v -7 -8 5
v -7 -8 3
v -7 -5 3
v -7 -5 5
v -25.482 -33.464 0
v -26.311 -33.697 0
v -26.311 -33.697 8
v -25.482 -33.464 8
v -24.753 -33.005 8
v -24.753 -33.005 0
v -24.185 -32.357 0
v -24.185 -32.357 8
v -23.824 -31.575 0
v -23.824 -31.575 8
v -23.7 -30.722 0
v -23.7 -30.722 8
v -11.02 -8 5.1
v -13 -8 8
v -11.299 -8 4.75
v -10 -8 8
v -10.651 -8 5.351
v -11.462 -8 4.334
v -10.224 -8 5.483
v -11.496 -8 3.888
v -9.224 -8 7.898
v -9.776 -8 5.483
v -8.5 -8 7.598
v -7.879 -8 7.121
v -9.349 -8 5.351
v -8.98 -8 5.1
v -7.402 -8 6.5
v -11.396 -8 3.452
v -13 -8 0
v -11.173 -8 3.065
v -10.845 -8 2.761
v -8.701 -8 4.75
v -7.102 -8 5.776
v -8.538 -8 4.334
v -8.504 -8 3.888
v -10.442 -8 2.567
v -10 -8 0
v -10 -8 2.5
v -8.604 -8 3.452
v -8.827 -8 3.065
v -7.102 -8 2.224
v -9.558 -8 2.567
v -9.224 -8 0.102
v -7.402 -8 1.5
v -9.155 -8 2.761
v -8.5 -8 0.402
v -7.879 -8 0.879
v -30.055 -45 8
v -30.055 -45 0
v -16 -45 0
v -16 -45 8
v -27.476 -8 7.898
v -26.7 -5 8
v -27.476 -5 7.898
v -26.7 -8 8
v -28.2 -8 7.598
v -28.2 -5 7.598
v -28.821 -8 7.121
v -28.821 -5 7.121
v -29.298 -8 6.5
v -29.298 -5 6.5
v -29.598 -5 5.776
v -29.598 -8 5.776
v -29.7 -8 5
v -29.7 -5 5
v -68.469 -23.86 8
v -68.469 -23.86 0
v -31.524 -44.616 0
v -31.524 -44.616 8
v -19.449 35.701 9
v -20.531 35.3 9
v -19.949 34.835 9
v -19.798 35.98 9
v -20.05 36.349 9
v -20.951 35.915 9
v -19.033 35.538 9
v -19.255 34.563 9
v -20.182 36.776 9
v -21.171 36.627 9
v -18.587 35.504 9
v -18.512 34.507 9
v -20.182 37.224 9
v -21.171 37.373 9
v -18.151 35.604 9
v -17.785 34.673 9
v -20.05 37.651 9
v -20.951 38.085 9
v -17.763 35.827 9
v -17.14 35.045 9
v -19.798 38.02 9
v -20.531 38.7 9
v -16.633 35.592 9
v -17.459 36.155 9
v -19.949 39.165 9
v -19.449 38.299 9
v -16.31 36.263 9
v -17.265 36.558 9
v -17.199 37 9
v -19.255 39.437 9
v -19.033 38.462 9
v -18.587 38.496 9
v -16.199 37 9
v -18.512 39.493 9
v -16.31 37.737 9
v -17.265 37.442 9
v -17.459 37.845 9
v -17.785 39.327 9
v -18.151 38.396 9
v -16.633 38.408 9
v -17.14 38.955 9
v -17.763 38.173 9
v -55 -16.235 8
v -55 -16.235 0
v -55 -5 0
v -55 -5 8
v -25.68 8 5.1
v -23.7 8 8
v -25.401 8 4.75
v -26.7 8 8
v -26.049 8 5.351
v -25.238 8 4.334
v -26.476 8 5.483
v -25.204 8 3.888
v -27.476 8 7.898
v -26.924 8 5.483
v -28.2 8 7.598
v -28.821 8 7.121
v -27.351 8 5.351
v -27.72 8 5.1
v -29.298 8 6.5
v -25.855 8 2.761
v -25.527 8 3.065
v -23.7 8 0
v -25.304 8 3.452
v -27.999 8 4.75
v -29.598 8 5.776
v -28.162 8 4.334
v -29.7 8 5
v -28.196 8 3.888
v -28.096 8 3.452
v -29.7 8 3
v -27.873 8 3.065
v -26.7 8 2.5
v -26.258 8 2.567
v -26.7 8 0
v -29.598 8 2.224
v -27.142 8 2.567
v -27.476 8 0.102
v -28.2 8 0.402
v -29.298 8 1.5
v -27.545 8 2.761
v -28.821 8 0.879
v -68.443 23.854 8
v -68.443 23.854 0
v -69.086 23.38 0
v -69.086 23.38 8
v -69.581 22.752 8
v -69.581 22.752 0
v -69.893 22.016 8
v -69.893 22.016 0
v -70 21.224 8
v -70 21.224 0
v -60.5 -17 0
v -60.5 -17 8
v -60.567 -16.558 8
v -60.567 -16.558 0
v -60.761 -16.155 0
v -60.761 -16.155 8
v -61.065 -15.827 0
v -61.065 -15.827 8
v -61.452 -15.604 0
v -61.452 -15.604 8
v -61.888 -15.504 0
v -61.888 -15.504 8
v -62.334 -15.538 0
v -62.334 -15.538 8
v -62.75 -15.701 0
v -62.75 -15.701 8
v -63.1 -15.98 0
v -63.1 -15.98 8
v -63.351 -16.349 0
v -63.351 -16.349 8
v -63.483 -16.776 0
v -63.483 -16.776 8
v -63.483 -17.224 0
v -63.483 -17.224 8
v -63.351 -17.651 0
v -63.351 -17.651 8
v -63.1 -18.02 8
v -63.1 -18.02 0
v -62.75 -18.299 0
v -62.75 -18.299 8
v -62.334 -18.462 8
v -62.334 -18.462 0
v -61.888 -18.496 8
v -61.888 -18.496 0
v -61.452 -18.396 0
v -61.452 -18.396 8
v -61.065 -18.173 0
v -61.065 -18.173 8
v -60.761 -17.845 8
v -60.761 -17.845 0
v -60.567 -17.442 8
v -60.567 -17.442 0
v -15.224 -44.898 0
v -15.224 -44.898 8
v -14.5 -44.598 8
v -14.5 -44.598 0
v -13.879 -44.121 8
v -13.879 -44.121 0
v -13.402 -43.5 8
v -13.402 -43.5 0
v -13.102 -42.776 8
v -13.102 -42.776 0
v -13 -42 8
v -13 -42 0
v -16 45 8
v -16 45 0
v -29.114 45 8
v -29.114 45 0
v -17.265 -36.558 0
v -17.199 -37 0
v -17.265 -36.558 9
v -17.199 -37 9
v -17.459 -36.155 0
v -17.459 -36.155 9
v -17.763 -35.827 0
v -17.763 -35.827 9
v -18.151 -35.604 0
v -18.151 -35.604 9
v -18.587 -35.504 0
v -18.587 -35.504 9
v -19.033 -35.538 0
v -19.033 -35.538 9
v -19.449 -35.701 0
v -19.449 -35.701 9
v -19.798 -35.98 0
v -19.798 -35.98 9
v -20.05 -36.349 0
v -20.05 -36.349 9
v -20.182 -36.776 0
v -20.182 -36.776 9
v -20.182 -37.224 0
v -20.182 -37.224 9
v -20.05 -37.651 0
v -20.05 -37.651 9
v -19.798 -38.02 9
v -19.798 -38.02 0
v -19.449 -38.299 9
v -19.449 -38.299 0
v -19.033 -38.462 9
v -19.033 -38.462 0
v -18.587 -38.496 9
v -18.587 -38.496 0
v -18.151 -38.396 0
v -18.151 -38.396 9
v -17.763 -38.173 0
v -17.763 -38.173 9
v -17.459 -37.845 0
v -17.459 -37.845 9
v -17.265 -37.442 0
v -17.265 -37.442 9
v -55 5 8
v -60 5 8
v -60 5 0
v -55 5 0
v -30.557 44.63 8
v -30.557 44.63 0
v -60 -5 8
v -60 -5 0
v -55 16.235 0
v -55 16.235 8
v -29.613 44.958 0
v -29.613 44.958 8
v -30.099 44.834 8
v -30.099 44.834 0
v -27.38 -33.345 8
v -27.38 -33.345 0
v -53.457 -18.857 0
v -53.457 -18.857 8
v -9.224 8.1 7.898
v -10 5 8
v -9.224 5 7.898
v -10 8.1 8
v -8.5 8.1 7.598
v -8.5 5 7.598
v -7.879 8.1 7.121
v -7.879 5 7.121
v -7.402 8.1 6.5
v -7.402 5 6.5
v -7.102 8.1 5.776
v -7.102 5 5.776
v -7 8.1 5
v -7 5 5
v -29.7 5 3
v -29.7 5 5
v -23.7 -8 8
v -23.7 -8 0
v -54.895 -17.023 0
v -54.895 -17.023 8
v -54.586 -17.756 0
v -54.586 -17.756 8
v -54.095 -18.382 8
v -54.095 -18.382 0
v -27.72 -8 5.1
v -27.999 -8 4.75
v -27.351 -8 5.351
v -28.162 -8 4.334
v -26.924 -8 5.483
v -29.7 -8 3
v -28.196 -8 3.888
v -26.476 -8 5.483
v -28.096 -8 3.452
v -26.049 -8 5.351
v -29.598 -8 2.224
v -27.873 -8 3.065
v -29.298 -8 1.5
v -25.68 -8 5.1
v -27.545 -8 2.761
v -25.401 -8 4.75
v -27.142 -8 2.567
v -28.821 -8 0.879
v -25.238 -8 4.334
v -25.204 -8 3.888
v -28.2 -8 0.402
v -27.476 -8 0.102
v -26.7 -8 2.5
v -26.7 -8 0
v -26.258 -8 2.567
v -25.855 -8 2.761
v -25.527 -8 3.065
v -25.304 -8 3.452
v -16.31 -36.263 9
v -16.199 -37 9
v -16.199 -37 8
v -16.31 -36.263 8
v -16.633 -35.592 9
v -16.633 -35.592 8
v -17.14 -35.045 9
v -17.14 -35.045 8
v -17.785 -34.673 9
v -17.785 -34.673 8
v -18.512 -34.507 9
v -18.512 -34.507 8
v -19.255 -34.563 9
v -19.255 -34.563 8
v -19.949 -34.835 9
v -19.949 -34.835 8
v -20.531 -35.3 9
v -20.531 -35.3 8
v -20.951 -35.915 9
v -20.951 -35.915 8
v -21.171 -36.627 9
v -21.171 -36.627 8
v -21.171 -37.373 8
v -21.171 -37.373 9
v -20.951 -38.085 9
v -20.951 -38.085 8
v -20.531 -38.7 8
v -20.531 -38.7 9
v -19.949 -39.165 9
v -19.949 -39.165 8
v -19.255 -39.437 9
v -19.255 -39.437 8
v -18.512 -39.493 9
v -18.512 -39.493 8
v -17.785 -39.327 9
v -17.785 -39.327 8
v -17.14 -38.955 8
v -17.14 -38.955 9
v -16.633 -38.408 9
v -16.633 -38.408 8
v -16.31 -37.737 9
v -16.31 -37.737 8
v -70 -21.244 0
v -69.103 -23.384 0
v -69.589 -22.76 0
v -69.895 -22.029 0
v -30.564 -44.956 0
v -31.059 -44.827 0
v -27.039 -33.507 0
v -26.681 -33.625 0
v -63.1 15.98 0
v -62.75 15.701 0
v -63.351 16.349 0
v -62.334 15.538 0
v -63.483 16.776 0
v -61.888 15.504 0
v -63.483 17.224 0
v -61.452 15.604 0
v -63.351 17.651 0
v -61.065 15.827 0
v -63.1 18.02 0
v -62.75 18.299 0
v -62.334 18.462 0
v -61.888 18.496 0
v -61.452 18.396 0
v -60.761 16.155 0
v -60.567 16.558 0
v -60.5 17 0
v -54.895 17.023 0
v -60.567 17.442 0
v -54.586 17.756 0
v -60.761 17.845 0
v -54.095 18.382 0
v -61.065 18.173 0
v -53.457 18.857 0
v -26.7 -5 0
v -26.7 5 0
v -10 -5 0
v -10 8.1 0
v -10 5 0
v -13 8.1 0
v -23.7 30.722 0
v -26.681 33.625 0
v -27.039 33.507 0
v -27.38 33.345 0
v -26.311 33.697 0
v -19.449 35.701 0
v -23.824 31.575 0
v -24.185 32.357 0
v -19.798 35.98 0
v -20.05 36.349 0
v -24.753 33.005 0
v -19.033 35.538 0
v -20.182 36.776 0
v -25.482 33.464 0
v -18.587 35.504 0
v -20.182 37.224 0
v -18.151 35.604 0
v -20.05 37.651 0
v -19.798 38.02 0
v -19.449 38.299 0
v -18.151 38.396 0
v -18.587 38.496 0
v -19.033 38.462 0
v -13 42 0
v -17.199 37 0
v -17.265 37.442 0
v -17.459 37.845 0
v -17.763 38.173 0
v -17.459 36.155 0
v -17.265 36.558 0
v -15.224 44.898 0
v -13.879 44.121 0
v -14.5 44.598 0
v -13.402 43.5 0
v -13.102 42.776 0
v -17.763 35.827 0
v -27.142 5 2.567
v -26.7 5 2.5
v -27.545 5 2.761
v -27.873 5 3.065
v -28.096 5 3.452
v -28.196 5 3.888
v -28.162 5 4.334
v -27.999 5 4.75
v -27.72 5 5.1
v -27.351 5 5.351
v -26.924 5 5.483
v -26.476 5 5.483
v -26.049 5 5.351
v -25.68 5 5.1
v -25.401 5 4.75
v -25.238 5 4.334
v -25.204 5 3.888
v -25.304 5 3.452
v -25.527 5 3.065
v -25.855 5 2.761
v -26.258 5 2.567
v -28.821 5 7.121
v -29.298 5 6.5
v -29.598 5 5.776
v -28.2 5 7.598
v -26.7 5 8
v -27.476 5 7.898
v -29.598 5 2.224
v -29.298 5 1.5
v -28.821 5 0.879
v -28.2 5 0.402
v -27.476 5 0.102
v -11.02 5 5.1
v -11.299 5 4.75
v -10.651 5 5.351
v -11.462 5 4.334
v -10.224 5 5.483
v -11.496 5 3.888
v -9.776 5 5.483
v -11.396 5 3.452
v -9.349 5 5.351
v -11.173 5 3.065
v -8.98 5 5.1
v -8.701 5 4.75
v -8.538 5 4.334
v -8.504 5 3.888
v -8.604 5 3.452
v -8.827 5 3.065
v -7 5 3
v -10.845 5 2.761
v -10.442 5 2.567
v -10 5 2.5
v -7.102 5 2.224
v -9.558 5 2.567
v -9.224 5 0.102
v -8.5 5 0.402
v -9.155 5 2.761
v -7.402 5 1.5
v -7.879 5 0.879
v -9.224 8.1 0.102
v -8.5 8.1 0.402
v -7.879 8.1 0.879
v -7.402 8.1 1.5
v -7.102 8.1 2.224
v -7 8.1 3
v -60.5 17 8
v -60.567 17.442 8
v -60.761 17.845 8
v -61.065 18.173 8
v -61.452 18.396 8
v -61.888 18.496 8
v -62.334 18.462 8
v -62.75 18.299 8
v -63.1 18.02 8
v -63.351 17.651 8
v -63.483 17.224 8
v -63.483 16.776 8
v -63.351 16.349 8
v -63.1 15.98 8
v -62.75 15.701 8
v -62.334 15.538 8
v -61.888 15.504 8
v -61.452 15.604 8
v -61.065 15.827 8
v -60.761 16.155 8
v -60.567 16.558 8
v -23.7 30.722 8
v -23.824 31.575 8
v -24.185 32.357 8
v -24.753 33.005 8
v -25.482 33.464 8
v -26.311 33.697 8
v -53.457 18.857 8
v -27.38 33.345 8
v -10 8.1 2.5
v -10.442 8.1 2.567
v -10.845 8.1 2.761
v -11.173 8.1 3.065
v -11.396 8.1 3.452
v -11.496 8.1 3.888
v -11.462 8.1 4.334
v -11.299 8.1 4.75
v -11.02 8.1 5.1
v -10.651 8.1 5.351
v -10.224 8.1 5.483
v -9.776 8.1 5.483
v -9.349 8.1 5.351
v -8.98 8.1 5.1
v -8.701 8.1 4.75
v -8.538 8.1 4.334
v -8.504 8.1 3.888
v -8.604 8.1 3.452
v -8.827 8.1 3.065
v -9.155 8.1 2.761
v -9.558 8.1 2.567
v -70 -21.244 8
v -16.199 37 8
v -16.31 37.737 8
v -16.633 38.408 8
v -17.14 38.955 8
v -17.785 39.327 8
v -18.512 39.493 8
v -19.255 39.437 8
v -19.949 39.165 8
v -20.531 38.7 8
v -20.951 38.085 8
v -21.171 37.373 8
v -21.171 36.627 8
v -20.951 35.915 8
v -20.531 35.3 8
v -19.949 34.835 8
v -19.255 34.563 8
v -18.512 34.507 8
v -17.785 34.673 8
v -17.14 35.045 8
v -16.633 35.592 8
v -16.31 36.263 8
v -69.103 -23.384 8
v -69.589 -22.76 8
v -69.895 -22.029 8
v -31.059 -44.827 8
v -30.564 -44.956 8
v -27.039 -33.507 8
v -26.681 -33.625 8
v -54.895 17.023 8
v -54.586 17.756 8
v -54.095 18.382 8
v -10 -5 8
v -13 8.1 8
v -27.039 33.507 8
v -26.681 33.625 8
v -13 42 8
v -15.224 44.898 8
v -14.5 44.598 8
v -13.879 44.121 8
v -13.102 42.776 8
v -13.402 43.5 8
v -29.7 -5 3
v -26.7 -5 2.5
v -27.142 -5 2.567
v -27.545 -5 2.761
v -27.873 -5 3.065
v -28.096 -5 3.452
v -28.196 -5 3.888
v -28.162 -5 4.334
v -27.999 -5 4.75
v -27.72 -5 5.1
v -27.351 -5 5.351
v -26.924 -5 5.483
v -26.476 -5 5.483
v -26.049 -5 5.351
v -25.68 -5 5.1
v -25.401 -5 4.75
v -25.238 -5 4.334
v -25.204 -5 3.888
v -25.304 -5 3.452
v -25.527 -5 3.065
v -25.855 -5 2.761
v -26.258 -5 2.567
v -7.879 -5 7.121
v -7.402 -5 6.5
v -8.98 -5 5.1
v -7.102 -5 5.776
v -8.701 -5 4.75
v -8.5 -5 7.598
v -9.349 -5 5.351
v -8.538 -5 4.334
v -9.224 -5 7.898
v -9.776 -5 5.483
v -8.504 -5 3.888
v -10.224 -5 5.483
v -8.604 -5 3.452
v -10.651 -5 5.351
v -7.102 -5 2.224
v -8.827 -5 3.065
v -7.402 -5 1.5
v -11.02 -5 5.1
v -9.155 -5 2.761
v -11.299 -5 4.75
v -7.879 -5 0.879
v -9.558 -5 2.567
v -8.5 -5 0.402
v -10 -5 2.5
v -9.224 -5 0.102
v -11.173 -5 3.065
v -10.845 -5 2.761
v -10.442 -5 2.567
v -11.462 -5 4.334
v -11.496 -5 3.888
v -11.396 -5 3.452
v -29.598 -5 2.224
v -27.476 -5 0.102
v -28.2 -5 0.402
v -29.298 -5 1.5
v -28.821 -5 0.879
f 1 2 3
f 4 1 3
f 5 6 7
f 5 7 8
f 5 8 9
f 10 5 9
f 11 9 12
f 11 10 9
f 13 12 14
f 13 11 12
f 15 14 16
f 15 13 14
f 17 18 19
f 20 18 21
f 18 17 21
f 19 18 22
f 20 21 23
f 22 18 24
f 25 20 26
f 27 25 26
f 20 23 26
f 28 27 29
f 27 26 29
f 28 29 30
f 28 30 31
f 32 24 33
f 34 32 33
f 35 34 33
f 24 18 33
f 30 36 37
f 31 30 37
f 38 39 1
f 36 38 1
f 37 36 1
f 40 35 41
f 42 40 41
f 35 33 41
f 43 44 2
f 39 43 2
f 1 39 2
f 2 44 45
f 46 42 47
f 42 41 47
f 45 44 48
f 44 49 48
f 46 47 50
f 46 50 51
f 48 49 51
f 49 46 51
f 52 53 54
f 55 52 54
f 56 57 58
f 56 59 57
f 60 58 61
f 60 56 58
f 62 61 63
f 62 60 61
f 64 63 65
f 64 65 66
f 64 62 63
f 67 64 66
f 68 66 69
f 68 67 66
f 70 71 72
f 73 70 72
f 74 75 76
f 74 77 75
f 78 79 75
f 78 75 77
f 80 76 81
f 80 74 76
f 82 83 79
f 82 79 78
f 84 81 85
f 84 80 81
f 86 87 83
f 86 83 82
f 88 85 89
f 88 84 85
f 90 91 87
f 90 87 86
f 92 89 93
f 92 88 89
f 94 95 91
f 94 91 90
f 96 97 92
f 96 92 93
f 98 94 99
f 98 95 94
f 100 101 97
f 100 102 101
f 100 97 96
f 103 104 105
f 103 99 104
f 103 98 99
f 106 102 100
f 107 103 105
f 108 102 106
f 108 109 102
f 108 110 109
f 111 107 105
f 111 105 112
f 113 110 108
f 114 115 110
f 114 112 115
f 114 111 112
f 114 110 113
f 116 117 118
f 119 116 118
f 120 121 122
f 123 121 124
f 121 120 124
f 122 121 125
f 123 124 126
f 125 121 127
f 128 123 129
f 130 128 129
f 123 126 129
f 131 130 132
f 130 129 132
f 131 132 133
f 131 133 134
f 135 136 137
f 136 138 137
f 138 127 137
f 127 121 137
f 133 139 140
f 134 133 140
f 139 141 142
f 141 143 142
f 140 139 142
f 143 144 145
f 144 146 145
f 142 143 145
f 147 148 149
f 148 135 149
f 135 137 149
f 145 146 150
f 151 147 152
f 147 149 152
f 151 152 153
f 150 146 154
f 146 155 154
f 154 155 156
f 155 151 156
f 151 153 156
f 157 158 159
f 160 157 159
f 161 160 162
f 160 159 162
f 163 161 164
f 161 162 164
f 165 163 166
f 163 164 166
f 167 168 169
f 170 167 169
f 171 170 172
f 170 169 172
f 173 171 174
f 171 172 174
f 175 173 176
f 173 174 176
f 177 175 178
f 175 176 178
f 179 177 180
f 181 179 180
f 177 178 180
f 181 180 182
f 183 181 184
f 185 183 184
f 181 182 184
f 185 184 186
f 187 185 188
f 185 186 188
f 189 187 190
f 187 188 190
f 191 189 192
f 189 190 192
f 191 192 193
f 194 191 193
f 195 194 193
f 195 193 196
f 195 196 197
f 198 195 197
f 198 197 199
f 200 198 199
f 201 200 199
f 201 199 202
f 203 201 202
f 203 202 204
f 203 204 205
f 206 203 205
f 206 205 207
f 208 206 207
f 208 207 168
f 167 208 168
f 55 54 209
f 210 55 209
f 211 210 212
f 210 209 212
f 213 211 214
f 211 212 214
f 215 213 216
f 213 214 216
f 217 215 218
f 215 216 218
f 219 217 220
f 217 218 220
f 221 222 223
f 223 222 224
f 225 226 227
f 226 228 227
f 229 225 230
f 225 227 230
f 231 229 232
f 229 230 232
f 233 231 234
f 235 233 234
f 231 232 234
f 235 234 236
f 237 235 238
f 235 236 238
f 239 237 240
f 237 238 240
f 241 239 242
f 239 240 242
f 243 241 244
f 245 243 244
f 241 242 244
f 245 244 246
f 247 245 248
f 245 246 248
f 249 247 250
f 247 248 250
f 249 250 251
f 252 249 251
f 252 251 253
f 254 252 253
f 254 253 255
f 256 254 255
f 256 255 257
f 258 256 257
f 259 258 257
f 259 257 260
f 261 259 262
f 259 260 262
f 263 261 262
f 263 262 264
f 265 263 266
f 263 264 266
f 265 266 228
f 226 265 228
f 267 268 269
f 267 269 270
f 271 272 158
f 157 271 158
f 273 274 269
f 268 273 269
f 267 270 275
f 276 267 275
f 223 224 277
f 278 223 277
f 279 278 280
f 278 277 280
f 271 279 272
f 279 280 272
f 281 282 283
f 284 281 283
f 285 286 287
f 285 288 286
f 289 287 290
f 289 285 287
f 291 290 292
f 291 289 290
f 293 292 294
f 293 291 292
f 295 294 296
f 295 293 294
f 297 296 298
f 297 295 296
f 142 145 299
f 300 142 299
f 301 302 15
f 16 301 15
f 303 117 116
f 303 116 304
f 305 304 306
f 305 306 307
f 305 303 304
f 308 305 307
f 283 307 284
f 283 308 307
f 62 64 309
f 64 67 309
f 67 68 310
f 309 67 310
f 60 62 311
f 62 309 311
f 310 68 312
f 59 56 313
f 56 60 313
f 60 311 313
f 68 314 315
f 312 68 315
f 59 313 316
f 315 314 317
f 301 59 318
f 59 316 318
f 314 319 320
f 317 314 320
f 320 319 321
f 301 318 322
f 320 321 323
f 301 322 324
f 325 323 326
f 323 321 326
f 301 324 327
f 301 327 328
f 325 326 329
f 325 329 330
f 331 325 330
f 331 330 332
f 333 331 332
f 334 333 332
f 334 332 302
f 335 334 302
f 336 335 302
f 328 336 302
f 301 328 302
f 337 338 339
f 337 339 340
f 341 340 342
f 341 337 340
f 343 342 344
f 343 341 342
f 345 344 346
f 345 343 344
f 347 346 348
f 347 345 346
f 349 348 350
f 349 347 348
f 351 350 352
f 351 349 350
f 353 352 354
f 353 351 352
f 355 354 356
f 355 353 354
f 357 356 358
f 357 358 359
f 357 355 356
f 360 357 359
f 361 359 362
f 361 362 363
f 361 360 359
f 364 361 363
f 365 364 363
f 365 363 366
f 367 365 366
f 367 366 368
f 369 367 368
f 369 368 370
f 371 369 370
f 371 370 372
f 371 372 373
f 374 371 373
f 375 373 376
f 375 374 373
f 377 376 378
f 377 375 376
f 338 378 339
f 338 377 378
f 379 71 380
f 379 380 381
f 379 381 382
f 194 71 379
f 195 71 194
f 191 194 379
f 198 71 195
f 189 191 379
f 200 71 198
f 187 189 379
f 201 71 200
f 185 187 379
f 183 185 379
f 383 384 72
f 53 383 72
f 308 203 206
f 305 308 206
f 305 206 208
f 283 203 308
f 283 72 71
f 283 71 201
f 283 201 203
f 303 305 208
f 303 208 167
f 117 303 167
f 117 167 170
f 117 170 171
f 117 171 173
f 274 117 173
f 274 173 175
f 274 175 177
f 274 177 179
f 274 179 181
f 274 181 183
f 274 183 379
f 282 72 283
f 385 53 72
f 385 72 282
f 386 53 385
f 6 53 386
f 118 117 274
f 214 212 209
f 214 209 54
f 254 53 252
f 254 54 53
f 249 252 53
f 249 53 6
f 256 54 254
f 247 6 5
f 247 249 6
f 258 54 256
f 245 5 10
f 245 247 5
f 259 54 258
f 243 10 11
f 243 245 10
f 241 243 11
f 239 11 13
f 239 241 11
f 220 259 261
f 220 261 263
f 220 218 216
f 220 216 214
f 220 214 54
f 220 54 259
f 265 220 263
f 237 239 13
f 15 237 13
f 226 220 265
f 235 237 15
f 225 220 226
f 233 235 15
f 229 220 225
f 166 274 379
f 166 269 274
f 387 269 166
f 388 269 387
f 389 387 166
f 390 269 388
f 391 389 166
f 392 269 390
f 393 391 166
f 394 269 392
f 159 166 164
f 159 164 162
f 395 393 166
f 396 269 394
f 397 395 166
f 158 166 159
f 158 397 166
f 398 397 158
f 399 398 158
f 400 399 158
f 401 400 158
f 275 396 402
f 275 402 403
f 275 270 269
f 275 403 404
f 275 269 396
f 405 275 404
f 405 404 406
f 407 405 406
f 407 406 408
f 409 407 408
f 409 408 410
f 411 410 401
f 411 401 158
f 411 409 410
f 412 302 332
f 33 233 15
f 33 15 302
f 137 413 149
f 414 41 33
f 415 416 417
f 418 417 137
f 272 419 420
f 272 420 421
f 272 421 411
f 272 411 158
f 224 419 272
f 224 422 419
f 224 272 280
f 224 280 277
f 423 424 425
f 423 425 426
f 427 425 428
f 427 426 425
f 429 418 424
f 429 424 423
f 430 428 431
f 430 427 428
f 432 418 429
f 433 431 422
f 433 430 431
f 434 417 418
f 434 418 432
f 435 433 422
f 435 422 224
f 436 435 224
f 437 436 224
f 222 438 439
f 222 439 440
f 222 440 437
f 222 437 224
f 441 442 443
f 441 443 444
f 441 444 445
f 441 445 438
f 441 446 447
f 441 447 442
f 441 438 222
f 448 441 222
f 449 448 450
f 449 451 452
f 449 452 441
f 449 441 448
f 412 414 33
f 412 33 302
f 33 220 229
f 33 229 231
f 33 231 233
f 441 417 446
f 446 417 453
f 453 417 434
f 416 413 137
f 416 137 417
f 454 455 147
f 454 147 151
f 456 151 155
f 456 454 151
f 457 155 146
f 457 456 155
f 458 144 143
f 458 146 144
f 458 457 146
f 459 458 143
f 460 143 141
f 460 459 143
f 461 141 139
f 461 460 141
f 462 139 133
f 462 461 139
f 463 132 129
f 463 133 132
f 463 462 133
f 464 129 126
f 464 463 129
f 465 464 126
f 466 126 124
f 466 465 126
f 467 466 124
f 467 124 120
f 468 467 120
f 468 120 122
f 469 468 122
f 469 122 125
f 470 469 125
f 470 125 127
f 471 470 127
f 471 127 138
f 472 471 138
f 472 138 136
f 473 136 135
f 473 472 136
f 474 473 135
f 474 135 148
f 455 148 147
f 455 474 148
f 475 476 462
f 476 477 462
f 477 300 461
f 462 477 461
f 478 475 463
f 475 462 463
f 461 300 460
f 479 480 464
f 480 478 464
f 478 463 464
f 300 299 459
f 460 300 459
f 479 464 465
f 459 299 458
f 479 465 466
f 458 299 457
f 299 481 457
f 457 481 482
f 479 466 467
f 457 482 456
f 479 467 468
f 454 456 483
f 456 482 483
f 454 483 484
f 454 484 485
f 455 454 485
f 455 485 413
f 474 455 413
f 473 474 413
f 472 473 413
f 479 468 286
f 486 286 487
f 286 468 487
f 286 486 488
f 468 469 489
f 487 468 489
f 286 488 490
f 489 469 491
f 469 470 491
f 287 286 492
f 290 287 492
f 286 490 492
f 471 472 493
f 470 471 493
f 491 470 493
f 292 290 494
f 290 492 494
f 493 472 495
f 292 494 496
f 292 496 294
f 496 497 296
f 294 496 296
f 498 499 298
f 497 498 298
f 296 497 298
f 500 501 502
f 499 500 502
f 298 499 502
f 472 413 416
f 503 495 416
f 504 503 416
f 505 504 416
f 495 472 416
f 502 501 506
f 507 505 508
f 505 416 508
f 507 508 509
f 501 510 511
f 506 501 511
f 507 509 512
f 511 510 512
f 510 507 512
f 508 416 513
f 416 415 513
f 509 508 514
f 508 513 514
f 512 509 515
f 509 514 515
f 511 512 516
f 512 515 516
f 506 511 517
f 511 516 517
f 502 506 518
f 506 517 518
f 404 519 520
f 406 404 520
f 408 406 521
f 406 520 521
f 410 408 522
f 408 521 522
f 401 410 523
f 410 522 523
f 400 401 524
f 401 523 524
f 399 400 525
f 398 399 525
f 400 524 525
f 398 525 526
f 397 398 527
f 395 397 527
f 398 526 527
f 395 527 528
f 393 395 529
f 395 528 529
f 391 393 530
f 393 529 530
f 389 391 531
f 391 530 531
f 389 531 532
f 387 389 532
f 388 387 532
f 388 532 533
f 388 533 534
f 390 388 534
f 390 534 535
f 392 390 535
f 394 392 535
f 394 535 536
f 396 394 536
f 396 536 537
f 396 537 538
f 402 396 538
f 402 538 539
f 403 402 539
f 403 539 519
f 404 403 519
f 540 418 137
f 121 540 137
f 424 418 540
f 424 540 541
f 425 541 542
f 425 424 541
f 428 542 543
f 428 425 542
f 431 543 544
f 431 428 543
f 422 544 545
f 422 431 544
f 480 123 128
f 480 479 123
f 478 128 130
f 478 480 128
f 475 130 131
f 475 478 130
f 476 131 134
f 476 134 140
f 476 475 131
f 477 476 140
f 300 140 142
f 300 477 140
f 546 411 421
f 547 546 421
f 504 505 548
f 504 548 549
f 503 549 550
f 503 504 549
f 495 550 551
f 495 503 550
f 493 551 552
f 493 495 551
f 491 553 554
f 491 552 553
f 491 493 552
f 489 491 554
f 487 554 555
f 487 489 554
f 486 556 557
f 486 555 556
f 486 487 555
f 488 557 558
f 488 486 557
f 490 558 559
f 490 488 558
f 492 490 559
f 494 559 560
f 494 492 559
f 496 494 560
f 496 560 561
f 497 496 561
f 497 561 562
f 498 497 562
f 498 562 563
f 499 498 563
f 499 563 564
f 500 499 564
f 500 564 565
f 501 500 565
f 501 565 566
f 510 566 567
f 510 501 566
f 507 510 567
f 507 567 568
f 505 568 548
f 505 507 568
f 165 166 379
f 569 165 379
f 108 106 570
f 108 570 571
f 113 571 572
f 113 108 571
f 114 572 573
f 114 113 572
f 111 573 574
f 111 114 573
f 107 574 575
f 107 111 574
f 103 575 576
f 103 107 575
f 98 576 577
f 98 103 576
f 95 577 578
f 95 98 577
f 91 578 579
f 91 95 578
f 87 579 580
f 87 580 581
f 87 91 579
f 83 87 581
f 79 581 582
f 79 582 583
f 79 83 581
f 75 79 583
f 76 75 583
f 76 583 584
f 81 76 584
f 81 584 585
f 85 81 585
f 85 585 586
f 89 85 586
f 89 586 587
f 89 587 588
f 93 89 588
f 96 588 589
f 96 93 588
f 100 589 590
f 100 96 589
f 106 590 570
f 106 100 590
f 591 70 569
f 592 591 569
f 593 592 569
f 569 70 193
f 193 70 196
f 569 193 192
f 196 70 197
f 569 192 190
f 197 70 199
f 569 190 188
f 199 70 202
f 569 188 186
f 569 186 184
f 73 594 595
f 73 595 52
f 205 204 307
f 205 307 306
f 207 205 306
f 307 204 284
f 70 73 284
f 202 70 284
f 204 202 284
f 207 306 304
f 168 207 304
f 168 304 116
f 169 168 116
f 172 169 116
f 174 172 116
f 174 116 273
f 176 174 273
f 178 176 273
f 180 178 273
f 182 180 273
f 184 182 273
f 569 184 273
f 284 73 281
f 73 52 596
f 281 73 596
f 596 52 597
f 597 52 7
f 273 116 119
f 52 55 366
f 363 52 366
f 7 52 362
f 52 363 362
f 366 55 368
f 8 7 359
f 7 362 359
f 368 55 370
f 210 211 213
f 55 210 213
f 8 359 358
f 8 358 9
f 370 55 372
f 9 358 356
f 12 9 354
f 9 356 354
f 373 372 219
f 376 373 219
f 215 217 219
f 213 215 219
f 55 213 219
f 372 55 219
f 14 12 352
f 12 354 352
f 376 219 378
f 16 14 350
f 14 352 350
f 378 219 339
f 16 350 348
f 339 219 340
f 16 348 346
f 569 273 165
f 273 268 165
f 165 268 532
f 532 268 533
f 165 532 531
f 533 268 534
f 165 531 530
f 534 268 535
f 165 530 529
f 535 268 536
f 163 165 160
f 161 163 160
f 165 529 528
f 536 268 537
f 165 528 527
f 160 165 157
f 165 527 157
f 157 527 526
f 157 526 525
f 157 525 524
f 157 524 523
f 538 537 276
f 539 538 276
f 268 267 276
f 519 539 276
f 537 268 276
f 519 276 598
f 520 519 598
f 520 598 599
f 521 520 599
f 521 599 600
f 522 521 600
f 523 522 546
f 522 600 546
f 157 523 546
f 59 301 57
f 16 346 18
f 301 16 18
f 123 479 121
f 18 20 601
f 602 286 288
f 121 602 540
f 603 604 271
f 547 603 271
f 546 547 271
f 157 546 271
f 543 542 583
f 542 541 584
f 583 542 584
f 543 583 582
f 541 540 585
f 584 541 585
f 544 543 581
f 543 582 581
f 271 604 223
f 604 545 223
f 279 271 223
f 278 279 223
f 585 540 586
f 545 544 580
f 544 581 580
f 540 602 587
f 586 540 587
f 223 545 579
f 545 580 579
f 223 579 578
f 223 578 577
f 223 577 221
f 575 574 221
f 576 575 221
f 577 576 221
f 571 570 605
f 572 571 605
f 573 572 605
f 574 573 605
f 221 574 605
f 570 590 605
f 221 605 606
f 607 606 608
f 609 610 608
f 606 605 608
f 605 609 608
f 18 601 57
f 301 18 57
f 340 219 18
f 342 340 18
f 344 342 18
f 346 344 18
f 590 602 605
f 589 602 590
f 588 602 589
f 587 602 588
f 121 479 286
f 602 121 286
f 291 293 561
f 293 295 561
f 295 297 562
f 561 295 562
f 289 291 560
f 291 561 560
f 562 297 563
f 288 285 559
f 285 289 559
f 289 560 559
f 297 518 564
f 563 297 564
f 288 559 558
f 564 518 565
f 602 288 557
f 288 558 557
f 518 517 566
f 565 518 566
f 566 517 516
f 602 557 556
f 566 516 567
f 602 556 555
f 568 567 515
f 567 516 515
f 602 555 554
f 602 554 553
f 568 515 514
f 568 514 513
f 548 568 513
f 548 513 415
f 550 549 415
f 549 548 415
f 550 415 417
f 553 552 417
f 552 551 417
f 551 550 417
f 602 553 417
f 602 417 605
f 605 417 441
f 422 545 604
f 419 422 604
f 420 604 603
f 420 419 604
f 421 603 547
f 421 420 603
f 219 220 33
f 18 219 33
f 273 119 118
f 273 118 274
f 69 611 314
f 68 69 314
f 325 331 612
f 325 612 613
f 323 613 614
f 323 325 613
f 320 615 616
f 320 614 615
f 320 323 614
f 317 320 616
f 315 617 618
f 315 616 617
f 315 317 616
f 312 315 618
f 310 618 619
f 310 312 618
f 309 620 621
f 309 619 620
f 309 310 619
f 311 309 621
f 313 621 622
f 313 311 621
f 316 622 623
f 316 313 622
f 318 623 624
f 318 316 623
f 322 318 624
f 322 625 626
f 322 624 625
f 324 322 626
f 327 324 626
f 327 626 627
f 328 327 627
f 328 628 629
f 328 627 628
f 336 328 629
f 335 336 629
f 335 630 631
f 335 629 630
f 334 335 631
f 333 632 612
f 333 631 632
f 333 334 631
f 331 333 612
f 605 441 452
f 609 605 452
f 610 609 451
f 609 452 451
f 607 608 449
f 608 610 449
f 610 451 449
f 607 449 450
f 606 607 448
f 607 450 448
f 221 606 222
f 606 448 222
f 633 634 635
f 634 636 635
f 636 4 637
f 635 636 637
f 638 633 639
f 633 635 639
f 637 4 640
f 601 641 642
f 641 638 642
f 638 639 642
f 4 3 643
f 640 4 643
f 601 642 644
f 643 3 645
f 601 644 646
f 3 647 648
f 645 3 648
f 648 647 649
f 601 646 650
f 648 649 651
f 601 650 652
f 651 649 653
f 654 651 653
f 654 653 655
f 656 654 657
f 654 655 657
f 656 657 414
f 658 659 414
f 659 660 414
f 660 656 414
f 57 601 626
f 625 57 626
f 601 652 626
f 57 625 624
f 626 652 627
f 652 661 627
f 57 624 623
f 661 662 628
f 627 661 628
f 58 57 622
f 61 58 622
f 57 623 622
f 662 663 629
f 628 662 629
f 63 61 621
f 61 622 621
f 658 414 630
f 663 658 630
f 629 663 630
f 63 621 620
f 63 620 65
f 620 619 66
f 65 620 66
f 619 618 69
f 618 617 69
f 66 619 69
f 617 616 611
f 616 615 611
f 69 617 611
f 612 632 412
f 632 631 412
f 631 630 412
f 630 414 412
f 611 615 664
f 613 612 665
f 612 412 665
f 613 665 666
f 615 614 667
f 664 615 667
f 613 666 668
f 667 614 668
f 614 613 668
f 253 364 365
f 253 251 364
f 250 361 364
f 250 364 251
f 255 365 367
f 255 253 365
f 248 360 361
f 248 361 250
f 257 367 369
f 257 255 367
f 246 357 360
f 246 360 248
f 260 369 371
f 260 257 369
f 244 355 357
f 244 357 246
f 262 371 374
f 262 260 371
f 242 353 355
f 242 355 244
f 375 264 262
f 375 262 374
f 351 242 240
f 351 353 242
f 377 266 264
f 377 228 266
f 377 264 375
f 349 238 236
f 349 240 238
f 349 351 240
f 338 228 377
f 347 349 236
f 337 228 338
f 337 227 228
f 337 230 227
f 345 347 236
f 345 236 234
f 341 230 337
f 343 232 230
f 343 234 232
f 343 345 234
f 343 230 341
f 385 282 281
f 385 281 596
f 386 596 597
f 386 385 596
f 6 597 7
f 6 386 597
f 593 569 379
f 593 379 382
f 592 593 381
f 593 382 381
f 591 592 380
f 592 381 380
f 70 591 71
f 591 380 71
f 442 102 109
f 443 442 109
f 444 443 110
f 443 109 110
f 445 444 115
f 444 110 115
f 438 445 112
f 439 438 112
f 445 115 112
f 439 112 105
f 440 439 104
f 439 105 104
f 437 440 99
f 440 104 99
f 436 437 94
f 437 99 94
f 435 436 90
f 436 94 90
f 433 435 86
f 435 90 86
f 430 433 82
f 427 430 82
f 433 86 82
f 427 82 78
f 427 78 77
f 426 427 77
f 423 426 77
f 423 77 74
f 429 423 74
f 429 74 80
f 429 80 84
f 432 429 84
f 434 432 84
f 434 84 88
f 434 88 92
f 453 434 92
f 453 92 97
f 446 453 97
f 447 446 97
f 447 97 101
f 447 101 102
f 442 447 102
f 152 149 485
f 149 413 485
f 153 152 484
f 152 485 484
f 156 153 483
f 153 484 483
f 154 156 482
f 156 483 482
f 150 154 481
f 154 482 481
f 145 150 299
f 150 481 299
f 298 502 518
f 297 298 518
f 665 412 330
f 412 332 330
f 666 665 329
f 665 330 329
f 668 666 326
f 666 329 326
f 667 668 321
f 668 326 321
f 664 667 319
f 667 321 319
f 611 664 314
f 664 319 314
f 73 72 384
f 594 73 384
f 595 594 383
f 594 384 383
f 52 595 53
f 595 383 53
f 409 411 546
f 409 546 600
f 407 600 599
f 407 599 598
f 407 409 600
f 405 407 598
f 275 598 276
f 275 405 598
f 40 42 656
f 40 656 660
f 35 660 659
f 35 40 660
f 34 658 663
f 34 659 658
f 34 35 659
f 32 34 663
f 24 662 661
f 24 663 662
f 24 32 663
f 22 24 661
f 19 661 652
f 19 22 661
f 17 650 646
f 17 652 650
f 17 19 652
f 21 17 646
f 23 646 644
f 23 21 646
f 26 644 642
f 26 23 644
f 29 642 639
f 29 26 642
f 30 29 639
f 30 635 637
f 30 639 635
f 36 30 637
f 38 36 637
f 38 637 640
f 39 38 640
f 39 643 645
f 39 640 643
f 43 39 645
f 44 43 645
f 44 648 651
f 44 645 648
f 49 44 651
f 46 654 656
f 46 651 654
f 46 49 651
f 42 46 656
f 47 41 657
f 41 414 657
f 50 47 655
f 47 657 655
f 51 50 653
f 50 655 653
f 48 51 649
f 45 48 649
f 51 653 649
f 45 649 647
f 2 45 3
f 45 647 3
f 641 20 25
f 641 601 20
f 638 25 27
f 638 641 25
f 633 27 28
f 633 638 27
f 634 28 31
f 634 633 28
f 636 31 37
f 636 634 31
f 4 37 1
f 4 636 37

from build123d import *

# Parameters (mm, degrees)
EXTRUDE_1_DEPTH          = 8
SKETCH_2_R               = 1.5
CUT_EXTRUDE_1_DEPTH      = 84.600239234
EXTRUDE_START            = 1
SKETCH_7_R               = 2.5
SKETCH_7_R_2             = 1.5
EXTRUDE_5_DEPTH          = 1
CUT_EXTRUDE_2_DEPTH      = 10
CUT_EXTRUDE_2_DEPTH_BACK = 20
SKETCH_8_R               = 1.5
FILLET_1_R               = 3
FILLET_2_R               = 3


with BuildPart() as part:
    # 草图1 → 凸台-拉伸1 (new body)
    with BuildSketch(Plane.XY):
        Polygon((-29.882727096, 45), (-70, 23), (-70, 5), (-70, -5), (-70, -23), (-30.839658999, -45), (-13, -45), (-13, -8), (-7, -8), (-7, -5), (-13.8744125, -5), (-23.7, -5), (-29.7, -5), (-29.7, -8), (-23.7, -8), (-23.7, -33.722222222), (-26.7, -33.722222222), (-55, -18), (-55, -10), (-55, -5), (-60, -5), (-60, 5), (-55, 5), (-55, 10), (-55, 18), (-26.7, 33.722222222), (-23.7, 33.722222222), (-23.7, 8), (-29.7, 8), (-29.7, 5), (-23.7, 5), (-13.8744125, 5), (-7, 5), (-7, 8.100206116), (-13, 8.100206116), (-13, 45), (-13.841189827, 45), align=None)
    extrude(amount=EXTRUDE_1_DEPTH)

    # 草图2 → 切除-拉伸1 (cut, through all)
    with BuildSketch(Plane.XY.offset(8)):
        with Locations((-62, 17)):
            Circle(SKETCH_2_R)
        with Locations((-62, -17)):
            Circle(SKETCH_2_R)
        with Locations((-18.698729811, 37)):
            Circle(SKETCH_2_R)
        with Locations((-18.698729811, -37)):
            Circle(SKETCH_2_R)
    extrude(amount=-CUT_EXTRUDE_1_DEPTH, mode=Mode.SUBTRACT)

    # 草图7 → 凸台-拉伸5 (add)
    # profile 1 of 2: a face of its own
    with BuildSketch(Plane.XY.offset(8).offset(EXTRUDE_START)):
        with Locations((-18.698729811, 37)):
            Circle(SKETCH_7_R)
        with Locations((-18.698729811, 37)):
            Circle(SKETCH_7_R_2, mode=Mode.SUBTRACT)
    # profile 2 of 2: a face of its own
    with BuildSketch(Plane.XY.offset(8).offset(EXTRUDE_START)):
        with Locations((-18.698729811, -37)):
            Circle(SKETCH_7_R)
        with Locations((-18.698729811, -37)):
            Circle(SKETCH_7_R_2, mode=Mode.SUBTRACT)
    extrude(amount=-EXTRUDE_5_DEPTH)

    # 草图8 → 切除-拉伸2 (cut, two sides: drawn at the far end of the back side and taken through both)
    with BuildSketch(Plane(origin=(0, 8, 0), x_dir=(1, 0, 0), z_dir=(0, 1, 0)).offset(-CUT_EXTRUDE_2_DEPTH_BACK)):
        with Locations(Location((-26.7, -4, 0), (0, 0, 90))):
            Circle(SKETCH_8_R)
        with Locations(Location((-10, -4, 0), (0, 0, 90))):
            Circle(SKETCH_8_R)
    extrude(amount=CUT_EXTRUDE_2_DEPTH + CUT_EXTRUDE_2_DEPTH_BACK, mode=Mode.SUBTRACT)

    # 圆角1
    # the kernel refuses this fillet: 3 mm, written as the material it adds along each edge
    with BuildSketch(Plane(origin=(-55, -18, 0), x_dir=(0.8741572761215378, -0.4856429311786321, 0), z_dir=(0, 0, 1))) as fillet_1_piece_1:
        with BuildLine():
            CenterArc((FILLET_1_R * 0.588403348999, FILLET_1_R), FILLET_1_R, 209.054604099, 60.945395901)
            Line((-FILLET_1_R * 0.285753927123, FILLET_1_R * 0.514357068821), (0, 0))
            Line((0, 0), (FILLET_1_R * 0.588403348999, 0))
        make_face()
    extrude(amount=8)
    with BuildSketch(Plane(origin=(-55, 18, 0), x_dir=(0.8741572761215377, 0.4856429311786323, 0), z_dir=(0, 0, 1))) as fillet_1_piece_2:
        with BuildLine():
            CenterArc((FILLET_1_R * 0.588403348999, -FILLET_1_R), FILLET_1_R, 90, 60.945395901)
            Line((-FILLET_1_R * 0.285753927123, -FILLET_1_R * 0.514357068821), (0, 0))
            Line((0, 0), (FILLET_1_R * 0.588403348999, 0))
        make_face()
    extrude(amount=8)
    with BuildSketch(Plane(origin=(-26.7, -33.722222222, 0), x_dir=(1, 0, 0), z_dir=(0, 0, 1))) as fillet_1_piece_3:
        with BuildLine():
            CenterArc((FILLET_1_R * 0.259126028197, FILLET_1_R), FILLET_1_R, 240.945395901, 29.054604099)
            Line((-FILLET_1_R * 0.226516902981, FILLET_1_R * 0.125842723878), (0, 0))
            Line((0, 0), (FILLET_1_R * 0.259126028197, 0))
        make_face()
    extrude(amount=8)
    with BuildSketch(Plane(origin=(-23.7, -33.722222222, 0), x_dir=(0, 1, 0), z_dir=(0, 0, 1))) as fillet_1_piece_4:
        with BuildLine():
            CenterArc((FILLET_1_R, FILLET_1_R), FILLET_1_R, 180, 90)
            Line((0, FILLET_1_R), (0, 0))
            Line((0, 0), (FILLET_1_R, 0))
        make_face()
    extrude(amount=8)
    with BuildSketch(Plane(origin=(-26.7, 33.722222222, 0), x_dir=(1, 0, 0), z_dir=(0, 0, 1))) as fillet_1_piece_5:
        with BuildLine():
            CenterArc((FILLET_1_R * 0.259126028197, -FILLET_1_R), FILLET_1_R, 90, 29.054604099)
            Line((-FILLET_1_R * 0.226516902981, -FILLET_1_R * 0.125842723878), (0, 0))
            Line((0, 0), (FILLET_1_R * 0.259126028197, 0))
        make_face()
    extrude(amount=8)
    with BuildSketch(Plane(origin=(-23.7, 33.722222222, 0), x_dir=(0, -1, 0), z_dir=(0, 0, 1))) as fillet_1_piece_6:
        with BuildLine():
            CenterArc((FILLET_1_R, -FILLET_1_R), FILLET_1_R, 90, 90)
            Line((0, -FILLET_1_R), (0, 0))
            Line((0, 0), (FILLET_1_R, 0))
        make_face()
    extrude(amount=8)
    # the kernel refuses this fillet: 3 mm, written as the material it takes off along each edge
    with BuildSketch(Plane(origin=(-13, 45, -7.5), x_dir=(-1, 0, 0), z_dir=(0, 0, 1))) as fillet_1_2_piece_1:
        with BuildLine():
            CenterArc((FILLET_1_R, FILLET_1_R), FILLET_1_R, 180, 90)
            Line((0, FILLET_1_R), (0, 0))
            Line((0, 0), (FILLET_1_R, 0))
        make_face()
    extrude(amount=23, mode=Mode.SUBTRACT)
    with BuildSketch(Plane(origin=(-29.882727096, 45, -1.921488827), x_dir=(-0.8768105180064049, -0.48083605887385356, 0), z_dir=(0, 0, 1))) as fillet_1_2_piece_2:
        with BuildLine():
            CenterArc((FILLET_1_R * 0.256198510324, FILLET_1_R), FILLET_1_R, 241.259979418, 28.740020582)
            Line((-FILLET_1_R * 0.22463754855, FILLET_1_R * 0.123189481994), (0, 0))
            Line((0, 0), (FILLET_1_R * 0.256198510324, 0))
        make_face()
    extrude(amount=11.842977655, mode=Mode.SUBTRACT)
    with BuildSketch(Plane(origin=(-13, -45, -7.5), x_dir=(-1, 0, 0), z_dir=(0, 0, 1))) as fillet_1_2_piece_3:
        with BuildLine():
            CenterArc((FILLET_1_R, -FILLET_1_R), FILLET_1_R, 90, 90)
            Line((0, -FILLET_1_R), (0, 0))
            Line((0, 0), (FILLET_1_R, 0))
        make_face()
    extrude(amount=23, mode=Mode.SUBTRACT)
    with BuildSketch(Plane(origin=(-30.839658999, -45, -1.962479999), x_dir=(-0.8718388464587432, 0.4897928396837667, 0), z_dir=(0, 0, 1))) as fillet_1_2_piece_4:
        with BuildLine():
            CenterArc((FILLET_1_R * 0.261663999874, -FILLET_1_R), FILLET_1_R, 90, 29.326966439)
            Line((-FILLET_1_R * 0.22812883981, -FILLET_1_R * 0.128161153541), (0, 0))
            Line((0, 0), (FILLET_1_R * 0.261663999874, 0))
        make_face()
    extrude(amount=11.924959998, mode=Mode.SUBTRACT)
    with BuildSketch(Plane(origin=(-70, -23, -4.389060797), x_dir=(0, 1, 0), z_dir=(0, 0, 1))) as fillet_1_2_piece_5:
        with BuildLine():
            CenterArc((FILLET_1_R * 0.585208106279, -FILLET_1_R), FILLET_1_R, 90, 60.673033561)
            Line((-FILLET_1_R * 0.28663074018, -FILLET_1_R * 0.510207160316), (0, 0))
            Line((0, 0), (FILLET_1_R * 0.585208106279, 0))
        make_face()
    extrude(amount=16.778121594, mode=Mode.SUBTRACT)
    with BuildSketch(Plane(origin=(-70, 23, -4.440787922), x_dir=(0.8768105180064074, 0.48083605887384884, 0), z_dir=(0, 0, 1))) as fillet_1_2_piece_6:
        with BuildLine():
            CenterArc((FILLET_1_R * 0.592105056297, -FILLET_1_R), FILLET_1_R, 90, 61.259979418)
            Line((-FILLET_1_R * 0.284705461709, -FILLET_1_R * 0.519163941126), (0, 0))
            Line((0, 0), (FILLET_1_R * 0.592105056297, 0))
        make_face()
    extrude(amount=16.881575844, mode=Mode.SUBTRACT)

    # 圆角2
    fillet_2_edges = [part.edges().sort_by_distance(p)[0] for p in [
        (-29.7, 6.5, 8),
        (-7, 6.550103058, 8),
        (-7, -6.5, 8),
        (-29.7, -6.5, 8),
        (-7, 6.550103058, 0),
        (-29.7, 6.5, 0),
        (-29.7, -6.5, 0),
        (-7, -6.5, 0),
    ]]
    fillet(fillet_2_edges, radius=FILLET_2_R)


solid = part.part
